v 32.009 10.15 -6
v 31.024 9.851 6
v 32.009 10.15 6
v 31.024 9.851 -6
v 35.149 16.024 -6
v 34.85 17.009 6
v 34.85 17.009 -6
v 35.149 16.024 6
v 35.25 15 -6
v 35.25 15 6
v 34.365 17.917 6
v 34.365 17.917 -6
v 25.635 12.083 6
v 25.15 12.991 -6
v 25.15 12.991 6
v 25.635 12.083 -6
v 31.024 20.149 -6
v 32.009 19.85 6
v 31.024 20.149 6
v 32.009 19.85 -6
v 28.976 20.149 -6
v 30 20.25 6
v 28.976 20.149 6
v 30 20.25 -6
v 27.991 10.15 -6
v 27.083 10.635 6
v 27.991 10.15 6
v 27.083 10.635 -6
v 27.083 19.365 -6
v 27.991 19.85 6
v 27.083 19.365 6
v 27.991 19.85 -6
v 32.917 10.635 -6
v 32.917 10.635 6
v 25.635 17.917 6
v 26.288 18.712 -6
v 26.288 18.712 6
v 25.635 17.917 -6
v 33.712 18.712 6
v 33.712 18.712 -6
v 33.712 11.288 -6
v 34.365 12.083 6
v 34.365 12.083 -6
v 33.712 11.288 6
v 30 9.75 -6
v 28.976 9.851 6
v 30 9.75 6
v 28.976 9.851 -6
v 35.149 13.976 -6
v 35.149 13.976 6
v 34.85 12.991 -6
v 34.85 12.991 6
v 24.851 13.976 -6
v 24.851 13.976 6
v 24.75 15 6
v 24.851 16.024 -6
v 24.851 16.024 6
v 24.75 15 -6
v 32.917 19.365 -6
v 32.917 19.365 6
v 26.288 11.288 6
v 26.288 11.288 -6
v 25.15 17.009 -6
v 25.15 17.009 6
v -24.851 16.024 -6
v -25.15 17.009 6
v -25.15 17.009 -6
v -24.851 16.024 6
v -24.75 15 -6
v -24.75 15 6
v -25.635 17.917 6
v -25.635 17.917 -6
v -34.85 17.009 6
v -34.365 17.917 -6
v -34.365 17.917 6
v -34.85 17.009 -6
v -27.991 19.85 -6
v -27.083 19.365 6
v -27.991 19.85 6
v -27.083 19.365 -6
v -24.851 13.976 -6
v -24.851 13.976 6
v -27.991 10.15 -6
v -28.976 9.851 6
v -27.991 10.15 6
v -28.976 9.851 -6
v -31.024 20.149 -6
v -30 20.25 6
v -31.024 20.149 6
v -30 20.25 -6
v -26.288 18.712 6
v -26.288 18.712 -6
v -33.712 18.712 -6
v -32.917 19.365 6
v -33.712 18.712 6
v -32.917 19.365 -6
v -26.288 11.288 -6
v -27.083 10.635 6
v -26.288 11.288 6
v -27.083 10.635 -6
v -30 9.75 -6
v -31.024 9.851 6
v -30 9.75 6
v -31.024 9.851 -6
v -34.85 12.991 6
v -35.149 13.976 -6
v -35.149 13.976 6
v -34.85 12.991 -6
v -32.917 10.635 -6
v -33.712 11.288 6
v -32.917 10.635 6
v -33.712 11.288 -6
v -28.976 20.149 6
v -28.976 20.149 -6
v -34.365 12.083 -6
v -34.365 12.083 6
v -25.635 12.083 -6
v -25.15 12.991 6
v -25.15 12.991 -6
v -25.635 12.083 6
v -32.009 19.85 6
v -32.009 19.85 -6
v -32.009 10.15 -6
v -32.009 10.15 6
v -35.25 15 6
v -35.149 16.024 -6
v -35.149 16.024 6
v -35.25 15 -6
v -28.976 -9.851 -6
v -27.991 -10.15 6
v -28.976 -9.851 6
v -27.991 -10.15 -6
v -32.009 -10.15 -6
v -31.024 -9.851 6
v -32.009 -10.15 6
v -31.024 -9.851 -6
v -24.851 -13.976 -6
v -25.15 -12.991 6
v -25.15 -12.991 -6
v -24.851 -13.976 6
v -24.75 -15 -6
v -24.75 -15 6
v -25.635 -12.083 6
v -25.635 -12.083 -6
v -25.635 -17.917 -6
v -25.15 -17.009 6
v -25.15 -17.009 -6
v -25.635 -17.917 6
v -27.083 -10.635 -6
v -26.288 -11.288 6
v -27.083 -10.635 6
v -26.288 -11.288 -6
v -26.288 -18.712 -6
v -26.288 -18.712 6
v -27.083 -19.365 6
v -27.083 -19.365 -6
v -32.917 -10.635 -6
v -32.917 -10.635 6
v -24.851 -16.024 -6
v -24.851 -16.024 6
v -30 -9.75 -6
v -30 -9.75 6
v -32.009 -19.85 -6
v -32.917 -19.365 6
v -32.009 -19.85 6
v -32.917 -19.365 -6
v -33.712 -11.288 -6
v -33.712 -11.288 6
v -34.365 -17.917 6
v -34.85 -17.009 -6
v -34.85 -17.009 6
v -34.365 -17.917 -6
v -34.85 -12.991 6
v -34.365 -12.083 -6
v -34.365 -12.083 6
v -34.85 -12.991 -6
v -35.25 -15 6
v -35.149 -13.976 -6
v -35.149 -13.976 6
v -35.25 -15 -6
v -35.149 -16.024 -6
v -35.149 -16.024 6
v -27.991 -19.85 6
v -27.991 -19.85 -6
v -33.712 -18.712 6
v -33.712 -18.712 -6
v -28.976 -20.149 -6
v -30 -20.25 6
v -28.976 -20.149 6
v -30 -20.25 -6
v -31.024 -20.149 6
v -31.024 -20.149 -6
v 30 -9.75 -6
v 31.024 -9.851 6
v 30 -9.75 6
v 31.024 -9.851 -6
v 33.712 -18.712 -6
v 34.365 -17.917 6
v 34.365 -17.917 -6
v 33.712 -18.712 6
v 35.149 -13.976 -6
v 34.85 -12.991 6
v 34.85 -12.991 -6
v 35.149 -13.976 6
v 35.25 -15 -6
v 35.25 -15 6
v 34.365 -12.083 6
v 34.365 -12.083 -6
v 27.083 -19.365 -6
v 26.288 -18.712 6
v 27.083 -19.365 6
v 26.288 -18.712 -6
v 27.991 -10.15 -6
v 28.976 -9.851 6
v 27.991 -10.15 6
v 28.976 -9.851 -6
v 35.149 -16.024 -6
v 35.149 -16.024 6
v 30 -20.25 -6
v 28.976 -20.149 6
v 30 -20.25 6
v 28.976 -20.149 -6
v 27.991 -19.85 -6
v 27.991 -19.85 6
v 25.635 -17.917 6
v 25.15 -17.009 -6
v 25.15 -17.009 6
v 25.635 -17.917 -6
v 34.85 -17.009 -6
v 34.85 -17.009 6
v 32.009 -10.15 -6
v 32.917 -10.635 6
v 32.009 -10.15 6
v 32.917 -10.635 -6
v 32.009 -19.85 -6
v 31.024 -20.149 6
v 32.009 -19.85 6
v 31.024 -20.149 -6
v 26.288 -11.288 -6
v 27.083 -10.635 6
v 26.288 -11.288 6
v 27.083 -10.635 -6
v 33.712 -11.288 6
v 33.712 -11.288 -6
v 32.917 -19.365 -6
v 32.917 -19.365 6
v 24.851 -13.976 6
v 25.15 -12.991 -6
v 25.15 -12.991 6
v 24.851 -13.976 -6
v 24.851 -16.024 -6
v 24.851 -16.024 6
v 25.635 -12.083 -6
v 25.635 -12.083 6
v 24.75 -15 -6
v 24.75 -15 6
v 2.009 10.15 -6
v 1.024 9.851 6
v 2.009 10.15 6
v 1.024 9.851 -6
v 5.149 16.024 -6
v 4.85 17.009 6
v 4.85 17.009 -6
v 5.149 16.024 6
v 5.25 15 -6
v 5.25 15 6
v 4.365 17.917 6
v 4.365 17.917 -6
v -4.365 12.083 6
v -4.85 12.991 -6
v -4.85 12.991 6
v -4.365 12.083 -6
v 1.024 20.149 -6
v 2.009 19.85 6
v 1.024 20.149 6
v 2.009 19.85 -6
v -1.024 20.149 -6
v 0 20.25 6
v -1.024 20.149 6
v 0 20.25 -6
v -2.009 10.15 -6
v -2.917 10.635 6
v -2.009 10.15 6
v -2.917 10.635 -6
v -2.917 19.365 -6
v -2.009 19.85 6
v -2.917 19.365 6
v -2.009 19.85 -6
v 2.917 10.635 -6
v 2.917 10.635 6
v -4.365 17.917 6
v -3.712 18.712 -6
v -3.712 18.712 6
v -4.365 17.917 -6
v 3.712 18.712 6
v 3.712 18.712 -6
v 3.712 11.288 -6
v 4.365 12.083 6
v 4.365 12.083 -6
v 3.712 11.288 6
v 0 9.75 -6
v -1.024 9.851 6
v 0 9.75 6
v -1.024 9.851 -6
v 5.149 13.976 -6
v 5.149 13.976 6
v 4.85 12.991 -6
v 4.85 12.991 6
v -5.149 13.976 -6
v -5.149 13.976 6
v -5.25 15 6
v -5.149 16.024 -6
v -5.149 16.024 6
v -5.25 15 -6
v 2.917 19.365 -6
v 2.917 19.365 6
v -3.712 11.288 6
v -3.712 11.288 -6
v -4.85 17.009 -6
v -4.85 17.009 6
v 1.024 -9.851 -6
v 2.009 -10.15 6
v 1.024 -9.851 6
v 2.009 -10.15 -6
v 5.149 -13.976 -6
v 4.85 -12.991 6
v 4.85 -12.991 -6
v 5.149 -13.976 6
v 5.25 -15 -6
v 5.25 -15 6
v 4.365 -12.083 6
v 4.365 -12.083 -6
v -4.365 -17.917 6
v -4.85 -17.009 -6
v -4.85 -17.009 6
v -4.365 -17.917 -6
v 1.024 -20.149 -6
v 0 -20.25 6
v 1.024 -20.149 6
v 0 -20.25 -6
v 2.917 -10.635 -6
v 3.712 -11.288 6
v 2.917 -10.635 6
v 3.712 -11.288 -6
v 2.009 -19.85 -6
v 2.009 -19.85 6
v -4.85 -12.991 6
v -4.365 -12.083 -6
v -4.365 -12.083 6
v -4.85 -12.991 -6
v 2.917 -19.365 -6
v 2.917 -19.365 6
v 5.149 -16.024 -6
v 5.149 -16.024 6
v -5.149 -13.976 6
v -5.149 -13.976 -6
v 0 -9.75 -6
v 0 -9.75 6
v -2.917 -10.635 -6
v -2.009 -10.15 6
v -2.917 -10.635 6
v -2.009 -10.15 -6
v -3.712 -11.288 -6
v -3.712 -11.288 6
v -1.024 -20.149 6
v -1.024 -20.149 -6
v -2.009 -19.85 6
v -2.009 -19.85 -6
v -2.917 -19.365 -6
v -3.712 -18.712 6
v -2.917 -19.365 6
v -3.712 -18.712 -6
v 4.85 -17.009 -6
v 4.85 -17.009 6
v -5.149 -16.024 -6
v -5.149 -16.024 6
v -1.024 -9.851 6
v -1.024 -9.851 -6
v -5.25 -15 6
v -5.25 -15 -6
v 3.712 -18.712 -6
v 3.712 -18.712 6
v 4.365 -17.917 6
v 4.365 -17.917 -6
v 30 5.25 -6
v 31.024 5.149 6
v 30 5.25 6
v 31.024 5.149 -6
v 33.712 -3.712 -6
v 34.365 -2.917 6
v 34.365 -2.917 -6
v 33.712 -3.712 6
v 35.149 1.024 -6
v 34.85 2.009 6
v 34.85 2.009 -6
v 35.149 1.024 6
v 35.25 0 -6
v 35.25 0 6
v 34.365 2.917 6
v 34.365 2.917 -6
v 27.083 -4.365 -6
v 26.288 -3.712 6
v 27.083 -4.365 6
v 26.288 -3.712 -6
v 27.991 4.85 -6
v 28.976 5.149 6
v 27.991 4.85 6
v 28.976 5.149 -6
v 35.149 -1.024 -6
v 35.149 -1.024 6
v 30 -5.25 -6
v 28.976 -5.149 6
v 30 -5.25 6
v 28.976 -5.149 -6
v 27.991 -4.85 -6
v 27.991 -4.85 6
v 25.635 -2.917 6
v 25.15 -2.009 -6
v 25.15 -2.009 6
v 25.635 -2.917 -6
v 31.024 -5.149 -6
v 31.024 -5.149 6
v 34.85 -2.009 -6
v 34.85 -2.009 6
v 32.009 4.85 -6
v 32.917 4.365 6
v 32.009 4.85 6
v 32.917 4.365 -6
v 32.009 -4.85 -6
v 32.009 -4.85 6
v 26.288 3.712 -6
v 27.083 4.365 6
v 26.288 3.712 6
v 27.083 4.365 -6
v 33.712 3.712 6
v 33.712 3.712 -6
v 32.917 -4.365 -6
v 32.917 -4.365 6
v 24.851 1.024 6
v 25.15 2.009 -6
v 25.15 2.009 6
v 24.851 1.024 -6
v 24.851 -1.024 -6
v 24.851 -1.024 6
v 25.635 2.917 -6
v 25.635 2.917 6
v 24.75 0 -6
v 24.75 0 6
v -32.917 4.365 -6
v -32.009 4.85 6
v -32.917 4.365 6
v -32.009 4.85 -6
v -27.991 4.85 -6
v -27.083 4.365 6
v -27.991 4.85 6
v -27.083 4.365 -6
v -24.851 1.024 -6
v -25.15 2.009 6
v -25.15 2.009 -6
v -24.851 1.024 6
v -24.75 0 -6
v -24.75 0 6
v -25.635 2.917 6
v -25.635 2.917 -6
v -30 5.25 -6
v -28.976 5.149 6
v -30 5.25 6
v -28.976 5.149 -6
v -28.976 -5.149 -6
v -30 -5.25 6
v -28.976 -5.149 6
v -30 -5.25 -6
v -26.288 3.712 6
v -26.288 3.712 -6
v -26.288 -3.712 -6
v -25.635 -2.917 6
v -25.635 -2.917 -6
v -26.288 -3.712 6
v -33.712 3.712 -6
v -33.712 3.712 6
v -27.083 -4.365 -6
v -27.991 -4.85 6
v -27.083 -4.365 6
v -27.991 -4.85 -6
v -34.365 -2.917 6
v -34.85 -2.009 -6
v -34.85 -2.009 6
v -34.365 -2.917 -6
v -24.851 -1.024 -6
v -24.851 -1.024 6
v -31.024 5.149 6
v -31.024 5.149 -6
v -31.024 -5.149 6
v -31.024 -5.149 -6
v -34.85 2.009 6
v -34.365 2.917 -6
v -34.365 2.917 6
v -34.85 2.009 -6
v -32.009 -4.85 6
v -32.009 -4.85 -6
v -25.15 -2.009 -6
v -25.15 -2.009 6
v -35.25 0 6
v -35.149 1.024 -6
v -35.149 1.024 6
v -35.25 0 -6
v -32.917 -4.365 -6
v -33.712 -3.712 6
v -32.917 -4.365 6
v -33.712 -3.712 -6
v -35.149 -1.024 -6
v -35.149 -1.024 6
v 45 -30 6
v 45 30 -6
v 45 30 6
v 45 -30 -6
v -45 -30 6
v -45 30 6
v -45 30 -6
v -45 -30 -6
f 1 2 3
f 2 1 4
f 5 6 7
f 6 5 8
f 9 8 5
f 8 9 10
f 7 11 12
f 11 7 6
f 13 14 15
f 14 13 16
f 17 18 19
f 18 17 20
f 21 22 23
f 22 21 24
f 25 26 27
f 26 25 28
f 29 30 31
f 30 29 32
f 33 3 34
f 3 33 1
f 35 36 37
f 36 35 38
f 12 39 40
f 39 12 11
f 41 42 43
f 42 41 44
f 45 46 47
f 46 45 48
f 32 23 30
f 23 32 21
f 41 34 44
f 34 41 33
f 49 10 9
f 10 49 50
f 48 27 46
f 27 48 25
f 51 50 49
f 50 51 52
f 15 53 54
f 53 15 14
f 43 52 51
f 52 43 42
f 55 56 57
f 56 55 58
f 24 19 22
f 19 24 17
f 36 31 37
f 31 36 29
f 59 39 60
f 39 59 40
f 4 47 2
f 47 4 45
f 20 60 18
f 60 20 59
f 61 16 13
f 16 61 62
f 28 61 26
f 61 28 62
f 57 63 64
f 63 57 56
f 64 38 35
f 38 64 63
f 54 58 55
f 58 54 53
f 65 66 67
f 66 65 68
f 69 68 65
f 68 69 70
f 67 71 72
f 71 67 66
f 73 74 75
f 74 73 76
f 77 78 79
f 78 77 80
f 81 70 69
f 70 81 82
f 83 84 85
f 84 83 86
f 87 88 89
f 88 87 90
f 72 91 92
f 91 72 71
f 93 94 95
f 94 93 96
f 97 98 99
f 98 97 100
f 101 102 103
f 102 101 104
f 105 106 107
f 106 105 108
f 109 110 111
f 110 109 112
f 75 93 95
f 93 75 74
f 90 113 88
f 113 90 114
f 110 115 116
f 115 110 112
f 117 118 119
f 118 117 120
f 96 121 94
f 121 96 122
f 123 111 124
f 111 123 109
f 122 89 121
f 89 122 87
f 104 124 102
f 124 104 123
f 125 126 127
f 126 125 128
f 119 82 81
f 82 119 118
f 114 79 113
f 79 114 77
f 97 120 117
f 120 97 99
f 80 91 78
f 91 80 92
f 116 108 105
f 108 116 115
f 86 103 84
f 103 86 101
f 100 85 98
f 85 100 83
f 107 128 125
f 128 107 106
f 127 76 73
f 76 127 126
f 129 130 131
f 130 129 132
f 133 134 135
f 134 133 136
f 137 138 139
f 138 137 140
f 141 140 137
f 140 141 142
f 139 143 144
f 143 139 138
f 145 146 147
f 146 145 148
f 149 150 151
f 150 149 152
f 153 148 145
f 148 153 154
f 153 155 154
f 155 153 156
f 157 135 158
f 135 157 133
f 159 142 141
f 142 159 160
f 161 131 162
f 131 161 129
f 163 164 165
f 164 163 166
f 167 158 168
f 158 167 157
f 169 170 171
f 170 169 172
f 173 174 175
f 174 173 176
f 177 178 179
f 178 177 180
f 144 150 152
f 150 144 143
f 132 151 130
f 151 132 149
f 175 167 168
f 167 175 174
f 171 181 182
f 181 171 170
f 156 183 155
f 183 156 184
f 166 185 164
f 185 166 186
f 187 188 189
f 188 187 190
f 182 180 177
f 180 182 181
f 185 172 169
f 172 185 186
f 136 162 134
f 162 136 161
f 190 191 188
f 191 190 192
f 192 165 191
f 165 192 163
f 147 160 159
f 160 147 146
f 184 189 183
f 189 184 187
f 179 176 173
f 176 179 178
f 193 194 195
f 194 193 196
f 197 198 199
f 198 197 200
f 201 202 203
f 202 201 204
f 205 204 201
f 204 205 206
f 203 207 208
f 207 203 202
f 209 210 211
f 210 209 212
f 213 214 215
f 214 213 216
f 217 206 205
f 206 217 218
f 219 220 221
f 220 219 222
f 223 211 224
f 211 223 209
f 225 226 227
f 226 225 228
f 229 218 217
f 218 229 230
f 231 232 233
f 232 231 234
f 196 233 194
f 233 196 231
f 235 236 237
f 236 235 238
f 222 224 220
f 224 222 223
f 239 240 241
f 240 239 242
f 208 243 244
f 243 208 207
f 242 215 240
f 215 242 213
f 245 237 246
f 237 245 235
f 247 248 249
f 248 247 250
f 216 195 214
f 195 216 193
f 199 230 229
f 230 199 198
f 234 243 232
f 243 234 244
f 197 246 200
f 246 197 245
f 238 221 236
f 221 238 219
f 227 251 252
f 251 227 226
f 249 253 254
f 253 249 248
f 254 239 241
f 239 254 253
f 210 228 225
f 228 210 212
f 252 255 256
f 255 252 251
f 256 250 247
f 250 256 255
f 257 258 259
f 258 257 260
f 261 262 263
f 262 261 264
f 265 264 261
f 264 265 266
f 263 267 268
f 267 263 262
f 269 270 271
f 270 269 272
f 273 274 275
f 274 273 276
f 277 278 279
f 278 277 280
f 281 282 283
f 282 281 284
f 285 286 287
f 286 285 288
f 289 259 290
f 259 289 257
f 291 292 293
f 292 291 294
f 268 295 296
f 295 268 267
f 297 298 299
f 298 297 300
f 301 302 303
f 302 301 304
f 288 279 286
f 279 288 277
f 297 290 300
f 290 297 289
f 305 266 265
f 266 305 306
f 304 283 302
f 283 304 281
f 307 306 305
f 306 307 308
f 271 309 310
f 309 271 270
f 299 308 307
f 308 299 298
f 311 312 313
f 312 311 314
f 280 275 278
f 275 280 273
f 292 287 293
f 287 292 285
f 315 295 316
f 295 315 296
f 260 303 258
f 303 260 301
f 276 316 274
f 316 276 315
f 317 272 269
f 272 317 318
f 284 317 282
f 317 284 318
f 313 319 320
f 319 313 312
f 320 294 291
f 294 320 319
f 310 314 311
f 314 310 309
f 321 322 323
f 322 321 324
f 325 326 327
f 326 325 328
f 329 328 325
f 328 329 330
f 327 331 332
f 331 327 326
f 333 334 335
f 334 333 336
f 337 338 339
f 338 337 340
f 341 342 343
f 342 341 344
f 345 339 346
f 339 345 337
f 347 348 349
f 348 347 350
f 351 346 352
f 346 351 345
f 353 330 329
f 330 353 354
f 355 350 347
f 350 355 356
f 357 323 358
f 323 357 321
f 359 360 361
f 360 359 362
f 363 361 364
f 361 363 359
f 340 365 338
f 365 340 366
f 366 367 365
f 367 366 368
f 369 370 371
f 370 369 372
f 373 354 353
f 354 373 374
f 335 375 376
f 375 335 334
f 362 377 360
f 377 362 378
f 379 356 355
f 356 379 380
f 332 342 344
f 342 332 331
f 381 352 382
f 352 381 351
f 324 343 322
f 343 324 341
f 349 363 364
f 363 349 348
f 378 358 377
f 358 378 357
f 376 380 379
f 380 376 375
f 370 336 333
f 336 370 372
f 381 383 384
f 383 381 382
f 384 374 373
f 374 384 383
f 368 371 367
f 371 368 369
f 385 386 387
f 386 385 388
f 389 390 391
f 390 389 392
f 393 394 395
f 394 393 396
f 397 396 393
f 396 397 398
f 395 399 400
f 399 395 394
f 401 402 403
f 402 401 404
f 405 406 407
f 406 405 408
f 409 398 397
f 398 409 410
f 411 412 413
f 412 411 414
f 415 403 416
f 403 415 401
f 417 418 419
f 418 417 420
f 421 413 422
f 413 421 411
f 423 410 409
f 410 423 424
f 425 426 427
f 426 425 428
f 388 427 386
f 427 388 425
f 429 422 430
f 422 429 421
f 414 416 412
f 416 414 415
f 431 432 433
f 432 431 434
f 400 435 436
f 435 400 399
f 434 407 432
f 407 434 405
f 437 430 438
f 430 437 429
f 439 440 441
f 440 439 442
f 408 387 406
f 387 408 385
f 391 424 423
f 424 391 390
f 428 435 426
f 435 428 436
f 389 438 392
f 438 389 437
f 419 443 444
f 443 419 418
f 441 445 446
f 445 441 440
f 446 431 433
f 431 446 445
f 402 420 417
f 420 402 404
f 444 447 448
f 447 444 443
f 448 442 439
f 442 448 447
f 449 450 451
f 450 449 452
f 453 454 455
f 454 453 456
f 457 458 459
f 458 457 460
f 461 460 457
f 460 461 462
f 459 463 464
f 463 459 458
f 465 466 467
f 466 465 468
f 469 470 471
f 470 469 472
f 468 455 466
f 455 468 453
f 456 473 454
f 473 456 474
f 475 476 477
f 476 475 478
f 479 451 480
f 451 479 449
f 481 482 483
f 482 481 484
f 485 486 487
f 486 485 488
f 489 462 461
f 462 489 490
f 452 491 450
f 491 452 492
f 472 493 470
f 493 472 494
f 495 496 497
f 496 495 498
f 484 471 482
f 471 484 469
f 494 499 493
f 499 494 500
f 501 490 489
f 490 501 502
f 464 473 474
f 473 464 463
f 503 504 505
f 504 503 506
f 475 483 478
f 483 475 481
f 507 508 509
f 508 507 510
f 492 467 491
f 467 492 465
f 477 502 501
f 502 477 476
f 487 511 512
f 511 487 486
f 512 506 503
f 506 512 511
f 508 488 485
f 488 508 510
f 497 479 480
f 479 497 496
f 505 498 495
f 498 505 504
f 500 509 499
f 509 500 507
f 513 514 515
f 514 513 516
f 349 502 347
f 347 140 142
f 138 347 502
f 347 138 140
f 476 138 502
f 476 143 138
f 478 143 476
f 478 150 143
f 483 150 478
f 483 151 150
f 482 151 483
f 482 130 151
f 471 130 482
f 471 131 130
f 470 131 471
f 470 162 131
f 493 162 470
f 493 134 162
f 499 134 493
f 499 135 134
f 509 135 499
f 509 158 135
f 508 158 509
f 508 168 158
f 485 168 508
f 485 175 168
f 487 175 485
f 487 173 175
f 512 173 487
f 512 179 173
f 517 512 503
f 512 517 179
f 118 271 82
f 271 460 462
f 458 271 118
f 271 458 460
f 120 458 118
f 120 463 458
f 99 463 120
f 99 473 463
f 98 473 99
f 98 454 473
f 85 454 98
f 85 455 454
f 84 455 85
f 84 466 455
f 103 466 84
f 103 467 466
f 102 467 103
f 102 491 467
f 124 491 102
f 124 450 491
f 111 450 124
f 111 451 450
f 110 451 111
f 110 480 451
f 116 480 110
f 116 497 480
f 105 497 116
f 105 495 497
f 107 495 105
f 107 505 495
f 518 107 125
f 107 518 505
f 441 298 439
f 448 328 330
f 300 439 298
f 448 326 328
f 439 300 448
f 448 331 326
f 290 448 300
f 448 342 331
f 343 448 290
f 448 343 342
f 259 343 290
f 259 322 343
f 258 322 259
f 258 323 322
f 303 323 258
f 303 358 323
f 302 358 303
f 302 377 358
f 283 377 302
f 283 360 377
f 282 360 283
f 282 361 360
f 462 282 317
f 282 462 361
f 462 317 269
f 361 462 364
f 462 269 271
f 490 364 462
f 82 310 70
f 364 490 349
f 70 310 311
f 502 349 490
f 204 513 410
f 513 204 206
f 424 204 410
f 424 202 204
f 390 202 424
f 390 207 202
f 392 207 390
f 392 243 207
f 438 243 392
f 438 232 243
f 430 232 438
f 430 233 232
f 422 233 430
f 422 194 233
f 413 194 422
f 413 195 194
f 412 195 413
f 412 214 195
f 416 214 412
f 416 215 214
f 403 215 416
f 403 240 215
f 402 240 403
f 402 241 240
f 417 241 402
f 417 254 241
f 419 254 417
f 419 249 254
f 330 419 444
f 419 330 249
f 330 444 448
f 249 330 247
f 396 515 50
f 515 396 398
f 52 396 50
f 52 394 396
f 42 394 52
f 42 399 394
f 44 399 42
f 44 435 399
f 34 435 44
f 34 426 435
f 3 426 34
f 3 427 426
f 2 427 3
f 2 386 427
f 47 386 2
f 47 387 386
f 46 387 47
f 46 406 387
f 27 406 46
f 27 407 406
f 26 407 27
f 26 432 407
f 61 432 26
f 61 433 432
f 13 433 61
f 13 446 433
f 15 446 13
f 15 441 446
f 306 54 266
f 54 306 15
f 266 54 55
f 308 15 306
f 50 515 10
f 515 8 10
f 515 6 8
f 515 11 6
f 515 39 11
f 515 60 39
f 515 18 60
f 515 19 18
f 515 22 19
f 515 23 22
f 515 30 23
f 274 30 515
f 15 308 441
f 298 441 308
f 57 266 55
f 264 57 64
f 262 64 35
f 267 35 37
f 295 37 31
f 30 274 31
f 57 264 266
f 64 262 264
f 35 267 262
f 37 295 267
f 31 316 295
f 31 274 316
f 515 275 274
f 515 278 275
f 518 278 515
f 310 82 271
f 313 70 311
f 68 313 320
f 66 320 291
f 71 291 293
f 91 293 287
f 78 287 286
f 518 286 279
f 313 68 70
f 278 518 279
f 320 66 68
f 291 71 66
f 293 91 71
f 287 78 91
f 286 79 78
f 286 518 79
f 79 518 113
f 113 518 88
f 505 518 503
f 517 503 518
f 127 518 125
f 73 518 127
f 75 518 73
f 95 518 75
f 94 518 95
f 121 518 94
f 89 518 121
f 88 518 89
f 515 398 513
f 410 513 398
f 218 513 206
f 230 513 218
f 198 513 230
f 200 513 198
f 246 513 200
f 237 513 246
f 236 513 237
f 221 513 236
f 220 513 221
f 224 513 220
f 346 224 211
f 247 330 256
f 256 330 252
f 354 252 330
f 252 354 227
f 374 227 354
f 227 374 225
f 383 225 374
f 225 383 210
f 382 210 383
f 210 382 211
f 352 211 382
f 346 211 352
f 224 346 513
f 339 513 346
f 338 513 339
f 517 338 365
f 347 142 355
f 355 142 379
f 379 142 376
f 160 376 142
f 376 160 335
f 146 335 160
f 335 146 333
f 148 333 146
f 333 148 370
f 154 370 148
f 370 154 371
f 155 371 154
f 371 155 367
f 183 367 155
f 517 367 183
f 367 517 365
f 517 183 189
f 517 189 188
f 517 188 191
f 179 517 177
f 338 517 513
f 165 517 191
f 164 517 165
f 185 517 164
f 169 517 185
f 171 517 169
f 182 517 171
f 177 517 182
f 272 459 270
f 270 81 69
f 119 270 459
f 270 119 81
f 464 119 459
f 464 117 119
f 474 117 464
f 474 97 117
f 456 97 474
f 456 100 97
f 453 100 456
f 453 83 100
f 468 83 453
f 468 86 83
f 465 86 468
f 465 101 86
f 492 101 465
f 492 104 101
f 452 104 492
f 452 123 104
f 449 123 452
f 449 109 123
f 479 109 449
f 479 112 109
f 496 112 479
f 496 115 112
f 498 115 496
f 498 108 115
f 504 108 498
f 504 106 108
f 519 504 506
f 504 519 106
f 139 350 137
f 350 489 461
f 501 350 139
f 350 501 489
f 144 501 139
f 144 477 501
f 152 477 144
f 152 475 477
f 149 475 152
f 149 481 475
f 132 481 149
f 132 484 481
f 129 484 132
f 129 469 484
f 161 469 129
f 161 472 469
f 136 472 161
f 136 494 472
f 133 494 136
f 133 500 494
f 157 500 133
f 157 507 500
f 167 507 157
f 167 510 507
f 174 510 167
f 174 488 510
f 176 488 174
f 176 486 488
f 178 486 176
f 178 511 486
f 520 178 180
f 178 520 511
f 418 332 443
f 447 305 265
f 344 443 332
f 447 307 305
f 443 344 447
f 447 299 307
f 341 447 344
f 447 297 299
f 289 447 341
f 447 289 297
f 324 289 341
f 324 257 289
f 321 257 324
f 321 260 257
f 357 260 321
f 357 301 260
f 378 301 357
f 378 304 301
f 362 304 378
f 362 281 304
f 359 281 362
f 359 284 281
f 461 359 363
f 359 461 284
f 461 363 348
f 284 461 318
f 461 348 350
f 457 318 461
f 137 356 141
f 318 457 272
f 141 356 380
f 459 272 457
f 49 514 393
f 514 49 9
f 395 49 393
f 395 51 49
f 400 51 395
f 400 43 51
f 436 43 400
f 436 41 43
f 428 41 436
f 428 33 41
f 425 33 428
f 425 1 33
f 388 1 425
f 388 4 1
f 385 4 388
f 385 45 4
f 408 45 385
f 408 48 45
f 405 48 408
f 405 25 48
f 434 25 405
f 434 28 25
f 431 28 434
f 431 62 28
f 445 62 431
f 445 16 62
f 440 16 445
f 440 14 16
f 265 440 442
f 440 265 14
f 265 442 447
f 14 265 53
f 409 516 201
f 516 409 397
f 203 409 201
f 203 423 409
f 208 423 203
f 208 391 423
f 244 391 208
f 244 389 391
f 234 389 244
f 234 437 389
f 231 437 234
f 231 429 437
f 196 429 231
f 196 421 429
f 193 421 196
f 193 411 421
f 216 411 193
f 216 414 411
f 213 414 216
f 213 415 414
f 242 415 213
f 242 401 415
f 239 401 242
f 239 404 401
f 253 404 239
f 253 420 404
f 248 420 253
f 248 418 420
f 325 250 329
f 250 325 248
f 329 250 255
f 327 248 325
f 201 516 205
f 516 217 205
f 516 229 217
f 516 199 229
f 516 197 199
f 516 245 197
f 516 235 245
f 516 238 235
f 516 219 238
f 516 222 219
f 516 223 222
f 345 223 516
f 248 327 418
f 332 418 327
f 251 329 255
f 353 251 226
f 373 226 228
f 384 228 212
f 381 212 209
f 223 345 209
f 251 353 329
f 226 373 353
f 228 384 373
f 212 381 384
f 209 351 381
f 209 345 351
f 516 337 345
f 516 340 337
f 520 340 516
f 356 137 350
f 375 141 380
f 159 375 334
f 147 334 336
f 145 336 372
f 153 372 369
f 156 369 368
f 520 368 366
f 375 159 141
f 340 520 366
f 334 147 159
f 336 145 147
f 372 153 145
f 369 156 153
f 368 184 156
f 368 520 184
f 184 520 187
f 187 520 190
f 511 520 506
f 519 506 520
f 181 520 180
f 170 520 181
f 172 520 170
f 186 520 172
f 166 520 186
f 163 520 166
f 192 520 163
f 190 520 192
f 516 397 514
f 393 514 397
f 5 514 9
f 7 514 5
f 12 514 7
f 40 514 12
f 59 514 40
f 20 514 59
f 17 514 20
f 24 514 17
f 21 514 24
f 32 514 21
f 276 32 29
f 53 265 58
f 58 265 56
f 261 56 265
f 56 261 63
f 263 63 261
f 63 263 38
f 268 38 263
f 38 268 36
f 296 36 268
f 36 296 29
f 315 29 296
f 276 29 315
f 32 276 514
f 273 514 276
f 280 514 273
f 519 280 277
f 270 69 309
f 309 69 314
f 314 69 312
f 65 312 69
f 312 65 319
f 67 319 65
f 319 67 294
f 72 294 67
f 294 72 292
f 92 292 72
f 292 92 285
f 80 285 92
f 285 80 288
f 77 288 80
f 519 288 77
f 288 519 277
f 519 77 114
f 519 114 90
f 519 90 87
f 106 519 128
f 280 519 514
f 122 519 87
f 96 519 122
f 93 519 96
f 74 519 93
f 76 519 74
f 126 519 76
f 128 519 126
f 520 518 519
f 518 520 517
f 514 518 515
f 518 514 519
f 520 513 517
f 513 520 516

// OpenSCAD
$fn = 32;

// ----------------------------------------------------------------------
// Corner plate 90 x 60 x 12
// 8 holes, centres taken from the edge offset
// ----------------------------------------------------------------------

// --- parameters (mm) ---
plate = [90, 60, 12];  // overall size (x, y, z)
holes = 8;             // number of holes the drawing asks for
hole_d = 10.5;         // hole diameter
edge = 15;             // hole centre offset from the plate edge

// --- derived feature positions (mm) ---
corner_x = plate[0] / 2 - edge;  // = 30   corner hole X
corner_y = plate[1] / 2 - edge;  // = 15   corner hole Y
feature_centers = [
  [corner_x, corner_y],
  [-corner_x, corner_y],
  [-corner_x, -corner_y],
  [corner_x, -corner_y],
  [0, corner_y],
  [0, -corner_y],
  [corner_x, 0],
  [-corner_x, 0]
];   // hole centres the loop below drills

// plate outline, every hole drilled through with the same cutters
difference() {
  cube(plate, center = true);
  for (centre = feature_centers)
    translate([centre[0], centre[1], 0])
      cylinder(d = hole_d, h = plate[2] + 2, center = true);
}
